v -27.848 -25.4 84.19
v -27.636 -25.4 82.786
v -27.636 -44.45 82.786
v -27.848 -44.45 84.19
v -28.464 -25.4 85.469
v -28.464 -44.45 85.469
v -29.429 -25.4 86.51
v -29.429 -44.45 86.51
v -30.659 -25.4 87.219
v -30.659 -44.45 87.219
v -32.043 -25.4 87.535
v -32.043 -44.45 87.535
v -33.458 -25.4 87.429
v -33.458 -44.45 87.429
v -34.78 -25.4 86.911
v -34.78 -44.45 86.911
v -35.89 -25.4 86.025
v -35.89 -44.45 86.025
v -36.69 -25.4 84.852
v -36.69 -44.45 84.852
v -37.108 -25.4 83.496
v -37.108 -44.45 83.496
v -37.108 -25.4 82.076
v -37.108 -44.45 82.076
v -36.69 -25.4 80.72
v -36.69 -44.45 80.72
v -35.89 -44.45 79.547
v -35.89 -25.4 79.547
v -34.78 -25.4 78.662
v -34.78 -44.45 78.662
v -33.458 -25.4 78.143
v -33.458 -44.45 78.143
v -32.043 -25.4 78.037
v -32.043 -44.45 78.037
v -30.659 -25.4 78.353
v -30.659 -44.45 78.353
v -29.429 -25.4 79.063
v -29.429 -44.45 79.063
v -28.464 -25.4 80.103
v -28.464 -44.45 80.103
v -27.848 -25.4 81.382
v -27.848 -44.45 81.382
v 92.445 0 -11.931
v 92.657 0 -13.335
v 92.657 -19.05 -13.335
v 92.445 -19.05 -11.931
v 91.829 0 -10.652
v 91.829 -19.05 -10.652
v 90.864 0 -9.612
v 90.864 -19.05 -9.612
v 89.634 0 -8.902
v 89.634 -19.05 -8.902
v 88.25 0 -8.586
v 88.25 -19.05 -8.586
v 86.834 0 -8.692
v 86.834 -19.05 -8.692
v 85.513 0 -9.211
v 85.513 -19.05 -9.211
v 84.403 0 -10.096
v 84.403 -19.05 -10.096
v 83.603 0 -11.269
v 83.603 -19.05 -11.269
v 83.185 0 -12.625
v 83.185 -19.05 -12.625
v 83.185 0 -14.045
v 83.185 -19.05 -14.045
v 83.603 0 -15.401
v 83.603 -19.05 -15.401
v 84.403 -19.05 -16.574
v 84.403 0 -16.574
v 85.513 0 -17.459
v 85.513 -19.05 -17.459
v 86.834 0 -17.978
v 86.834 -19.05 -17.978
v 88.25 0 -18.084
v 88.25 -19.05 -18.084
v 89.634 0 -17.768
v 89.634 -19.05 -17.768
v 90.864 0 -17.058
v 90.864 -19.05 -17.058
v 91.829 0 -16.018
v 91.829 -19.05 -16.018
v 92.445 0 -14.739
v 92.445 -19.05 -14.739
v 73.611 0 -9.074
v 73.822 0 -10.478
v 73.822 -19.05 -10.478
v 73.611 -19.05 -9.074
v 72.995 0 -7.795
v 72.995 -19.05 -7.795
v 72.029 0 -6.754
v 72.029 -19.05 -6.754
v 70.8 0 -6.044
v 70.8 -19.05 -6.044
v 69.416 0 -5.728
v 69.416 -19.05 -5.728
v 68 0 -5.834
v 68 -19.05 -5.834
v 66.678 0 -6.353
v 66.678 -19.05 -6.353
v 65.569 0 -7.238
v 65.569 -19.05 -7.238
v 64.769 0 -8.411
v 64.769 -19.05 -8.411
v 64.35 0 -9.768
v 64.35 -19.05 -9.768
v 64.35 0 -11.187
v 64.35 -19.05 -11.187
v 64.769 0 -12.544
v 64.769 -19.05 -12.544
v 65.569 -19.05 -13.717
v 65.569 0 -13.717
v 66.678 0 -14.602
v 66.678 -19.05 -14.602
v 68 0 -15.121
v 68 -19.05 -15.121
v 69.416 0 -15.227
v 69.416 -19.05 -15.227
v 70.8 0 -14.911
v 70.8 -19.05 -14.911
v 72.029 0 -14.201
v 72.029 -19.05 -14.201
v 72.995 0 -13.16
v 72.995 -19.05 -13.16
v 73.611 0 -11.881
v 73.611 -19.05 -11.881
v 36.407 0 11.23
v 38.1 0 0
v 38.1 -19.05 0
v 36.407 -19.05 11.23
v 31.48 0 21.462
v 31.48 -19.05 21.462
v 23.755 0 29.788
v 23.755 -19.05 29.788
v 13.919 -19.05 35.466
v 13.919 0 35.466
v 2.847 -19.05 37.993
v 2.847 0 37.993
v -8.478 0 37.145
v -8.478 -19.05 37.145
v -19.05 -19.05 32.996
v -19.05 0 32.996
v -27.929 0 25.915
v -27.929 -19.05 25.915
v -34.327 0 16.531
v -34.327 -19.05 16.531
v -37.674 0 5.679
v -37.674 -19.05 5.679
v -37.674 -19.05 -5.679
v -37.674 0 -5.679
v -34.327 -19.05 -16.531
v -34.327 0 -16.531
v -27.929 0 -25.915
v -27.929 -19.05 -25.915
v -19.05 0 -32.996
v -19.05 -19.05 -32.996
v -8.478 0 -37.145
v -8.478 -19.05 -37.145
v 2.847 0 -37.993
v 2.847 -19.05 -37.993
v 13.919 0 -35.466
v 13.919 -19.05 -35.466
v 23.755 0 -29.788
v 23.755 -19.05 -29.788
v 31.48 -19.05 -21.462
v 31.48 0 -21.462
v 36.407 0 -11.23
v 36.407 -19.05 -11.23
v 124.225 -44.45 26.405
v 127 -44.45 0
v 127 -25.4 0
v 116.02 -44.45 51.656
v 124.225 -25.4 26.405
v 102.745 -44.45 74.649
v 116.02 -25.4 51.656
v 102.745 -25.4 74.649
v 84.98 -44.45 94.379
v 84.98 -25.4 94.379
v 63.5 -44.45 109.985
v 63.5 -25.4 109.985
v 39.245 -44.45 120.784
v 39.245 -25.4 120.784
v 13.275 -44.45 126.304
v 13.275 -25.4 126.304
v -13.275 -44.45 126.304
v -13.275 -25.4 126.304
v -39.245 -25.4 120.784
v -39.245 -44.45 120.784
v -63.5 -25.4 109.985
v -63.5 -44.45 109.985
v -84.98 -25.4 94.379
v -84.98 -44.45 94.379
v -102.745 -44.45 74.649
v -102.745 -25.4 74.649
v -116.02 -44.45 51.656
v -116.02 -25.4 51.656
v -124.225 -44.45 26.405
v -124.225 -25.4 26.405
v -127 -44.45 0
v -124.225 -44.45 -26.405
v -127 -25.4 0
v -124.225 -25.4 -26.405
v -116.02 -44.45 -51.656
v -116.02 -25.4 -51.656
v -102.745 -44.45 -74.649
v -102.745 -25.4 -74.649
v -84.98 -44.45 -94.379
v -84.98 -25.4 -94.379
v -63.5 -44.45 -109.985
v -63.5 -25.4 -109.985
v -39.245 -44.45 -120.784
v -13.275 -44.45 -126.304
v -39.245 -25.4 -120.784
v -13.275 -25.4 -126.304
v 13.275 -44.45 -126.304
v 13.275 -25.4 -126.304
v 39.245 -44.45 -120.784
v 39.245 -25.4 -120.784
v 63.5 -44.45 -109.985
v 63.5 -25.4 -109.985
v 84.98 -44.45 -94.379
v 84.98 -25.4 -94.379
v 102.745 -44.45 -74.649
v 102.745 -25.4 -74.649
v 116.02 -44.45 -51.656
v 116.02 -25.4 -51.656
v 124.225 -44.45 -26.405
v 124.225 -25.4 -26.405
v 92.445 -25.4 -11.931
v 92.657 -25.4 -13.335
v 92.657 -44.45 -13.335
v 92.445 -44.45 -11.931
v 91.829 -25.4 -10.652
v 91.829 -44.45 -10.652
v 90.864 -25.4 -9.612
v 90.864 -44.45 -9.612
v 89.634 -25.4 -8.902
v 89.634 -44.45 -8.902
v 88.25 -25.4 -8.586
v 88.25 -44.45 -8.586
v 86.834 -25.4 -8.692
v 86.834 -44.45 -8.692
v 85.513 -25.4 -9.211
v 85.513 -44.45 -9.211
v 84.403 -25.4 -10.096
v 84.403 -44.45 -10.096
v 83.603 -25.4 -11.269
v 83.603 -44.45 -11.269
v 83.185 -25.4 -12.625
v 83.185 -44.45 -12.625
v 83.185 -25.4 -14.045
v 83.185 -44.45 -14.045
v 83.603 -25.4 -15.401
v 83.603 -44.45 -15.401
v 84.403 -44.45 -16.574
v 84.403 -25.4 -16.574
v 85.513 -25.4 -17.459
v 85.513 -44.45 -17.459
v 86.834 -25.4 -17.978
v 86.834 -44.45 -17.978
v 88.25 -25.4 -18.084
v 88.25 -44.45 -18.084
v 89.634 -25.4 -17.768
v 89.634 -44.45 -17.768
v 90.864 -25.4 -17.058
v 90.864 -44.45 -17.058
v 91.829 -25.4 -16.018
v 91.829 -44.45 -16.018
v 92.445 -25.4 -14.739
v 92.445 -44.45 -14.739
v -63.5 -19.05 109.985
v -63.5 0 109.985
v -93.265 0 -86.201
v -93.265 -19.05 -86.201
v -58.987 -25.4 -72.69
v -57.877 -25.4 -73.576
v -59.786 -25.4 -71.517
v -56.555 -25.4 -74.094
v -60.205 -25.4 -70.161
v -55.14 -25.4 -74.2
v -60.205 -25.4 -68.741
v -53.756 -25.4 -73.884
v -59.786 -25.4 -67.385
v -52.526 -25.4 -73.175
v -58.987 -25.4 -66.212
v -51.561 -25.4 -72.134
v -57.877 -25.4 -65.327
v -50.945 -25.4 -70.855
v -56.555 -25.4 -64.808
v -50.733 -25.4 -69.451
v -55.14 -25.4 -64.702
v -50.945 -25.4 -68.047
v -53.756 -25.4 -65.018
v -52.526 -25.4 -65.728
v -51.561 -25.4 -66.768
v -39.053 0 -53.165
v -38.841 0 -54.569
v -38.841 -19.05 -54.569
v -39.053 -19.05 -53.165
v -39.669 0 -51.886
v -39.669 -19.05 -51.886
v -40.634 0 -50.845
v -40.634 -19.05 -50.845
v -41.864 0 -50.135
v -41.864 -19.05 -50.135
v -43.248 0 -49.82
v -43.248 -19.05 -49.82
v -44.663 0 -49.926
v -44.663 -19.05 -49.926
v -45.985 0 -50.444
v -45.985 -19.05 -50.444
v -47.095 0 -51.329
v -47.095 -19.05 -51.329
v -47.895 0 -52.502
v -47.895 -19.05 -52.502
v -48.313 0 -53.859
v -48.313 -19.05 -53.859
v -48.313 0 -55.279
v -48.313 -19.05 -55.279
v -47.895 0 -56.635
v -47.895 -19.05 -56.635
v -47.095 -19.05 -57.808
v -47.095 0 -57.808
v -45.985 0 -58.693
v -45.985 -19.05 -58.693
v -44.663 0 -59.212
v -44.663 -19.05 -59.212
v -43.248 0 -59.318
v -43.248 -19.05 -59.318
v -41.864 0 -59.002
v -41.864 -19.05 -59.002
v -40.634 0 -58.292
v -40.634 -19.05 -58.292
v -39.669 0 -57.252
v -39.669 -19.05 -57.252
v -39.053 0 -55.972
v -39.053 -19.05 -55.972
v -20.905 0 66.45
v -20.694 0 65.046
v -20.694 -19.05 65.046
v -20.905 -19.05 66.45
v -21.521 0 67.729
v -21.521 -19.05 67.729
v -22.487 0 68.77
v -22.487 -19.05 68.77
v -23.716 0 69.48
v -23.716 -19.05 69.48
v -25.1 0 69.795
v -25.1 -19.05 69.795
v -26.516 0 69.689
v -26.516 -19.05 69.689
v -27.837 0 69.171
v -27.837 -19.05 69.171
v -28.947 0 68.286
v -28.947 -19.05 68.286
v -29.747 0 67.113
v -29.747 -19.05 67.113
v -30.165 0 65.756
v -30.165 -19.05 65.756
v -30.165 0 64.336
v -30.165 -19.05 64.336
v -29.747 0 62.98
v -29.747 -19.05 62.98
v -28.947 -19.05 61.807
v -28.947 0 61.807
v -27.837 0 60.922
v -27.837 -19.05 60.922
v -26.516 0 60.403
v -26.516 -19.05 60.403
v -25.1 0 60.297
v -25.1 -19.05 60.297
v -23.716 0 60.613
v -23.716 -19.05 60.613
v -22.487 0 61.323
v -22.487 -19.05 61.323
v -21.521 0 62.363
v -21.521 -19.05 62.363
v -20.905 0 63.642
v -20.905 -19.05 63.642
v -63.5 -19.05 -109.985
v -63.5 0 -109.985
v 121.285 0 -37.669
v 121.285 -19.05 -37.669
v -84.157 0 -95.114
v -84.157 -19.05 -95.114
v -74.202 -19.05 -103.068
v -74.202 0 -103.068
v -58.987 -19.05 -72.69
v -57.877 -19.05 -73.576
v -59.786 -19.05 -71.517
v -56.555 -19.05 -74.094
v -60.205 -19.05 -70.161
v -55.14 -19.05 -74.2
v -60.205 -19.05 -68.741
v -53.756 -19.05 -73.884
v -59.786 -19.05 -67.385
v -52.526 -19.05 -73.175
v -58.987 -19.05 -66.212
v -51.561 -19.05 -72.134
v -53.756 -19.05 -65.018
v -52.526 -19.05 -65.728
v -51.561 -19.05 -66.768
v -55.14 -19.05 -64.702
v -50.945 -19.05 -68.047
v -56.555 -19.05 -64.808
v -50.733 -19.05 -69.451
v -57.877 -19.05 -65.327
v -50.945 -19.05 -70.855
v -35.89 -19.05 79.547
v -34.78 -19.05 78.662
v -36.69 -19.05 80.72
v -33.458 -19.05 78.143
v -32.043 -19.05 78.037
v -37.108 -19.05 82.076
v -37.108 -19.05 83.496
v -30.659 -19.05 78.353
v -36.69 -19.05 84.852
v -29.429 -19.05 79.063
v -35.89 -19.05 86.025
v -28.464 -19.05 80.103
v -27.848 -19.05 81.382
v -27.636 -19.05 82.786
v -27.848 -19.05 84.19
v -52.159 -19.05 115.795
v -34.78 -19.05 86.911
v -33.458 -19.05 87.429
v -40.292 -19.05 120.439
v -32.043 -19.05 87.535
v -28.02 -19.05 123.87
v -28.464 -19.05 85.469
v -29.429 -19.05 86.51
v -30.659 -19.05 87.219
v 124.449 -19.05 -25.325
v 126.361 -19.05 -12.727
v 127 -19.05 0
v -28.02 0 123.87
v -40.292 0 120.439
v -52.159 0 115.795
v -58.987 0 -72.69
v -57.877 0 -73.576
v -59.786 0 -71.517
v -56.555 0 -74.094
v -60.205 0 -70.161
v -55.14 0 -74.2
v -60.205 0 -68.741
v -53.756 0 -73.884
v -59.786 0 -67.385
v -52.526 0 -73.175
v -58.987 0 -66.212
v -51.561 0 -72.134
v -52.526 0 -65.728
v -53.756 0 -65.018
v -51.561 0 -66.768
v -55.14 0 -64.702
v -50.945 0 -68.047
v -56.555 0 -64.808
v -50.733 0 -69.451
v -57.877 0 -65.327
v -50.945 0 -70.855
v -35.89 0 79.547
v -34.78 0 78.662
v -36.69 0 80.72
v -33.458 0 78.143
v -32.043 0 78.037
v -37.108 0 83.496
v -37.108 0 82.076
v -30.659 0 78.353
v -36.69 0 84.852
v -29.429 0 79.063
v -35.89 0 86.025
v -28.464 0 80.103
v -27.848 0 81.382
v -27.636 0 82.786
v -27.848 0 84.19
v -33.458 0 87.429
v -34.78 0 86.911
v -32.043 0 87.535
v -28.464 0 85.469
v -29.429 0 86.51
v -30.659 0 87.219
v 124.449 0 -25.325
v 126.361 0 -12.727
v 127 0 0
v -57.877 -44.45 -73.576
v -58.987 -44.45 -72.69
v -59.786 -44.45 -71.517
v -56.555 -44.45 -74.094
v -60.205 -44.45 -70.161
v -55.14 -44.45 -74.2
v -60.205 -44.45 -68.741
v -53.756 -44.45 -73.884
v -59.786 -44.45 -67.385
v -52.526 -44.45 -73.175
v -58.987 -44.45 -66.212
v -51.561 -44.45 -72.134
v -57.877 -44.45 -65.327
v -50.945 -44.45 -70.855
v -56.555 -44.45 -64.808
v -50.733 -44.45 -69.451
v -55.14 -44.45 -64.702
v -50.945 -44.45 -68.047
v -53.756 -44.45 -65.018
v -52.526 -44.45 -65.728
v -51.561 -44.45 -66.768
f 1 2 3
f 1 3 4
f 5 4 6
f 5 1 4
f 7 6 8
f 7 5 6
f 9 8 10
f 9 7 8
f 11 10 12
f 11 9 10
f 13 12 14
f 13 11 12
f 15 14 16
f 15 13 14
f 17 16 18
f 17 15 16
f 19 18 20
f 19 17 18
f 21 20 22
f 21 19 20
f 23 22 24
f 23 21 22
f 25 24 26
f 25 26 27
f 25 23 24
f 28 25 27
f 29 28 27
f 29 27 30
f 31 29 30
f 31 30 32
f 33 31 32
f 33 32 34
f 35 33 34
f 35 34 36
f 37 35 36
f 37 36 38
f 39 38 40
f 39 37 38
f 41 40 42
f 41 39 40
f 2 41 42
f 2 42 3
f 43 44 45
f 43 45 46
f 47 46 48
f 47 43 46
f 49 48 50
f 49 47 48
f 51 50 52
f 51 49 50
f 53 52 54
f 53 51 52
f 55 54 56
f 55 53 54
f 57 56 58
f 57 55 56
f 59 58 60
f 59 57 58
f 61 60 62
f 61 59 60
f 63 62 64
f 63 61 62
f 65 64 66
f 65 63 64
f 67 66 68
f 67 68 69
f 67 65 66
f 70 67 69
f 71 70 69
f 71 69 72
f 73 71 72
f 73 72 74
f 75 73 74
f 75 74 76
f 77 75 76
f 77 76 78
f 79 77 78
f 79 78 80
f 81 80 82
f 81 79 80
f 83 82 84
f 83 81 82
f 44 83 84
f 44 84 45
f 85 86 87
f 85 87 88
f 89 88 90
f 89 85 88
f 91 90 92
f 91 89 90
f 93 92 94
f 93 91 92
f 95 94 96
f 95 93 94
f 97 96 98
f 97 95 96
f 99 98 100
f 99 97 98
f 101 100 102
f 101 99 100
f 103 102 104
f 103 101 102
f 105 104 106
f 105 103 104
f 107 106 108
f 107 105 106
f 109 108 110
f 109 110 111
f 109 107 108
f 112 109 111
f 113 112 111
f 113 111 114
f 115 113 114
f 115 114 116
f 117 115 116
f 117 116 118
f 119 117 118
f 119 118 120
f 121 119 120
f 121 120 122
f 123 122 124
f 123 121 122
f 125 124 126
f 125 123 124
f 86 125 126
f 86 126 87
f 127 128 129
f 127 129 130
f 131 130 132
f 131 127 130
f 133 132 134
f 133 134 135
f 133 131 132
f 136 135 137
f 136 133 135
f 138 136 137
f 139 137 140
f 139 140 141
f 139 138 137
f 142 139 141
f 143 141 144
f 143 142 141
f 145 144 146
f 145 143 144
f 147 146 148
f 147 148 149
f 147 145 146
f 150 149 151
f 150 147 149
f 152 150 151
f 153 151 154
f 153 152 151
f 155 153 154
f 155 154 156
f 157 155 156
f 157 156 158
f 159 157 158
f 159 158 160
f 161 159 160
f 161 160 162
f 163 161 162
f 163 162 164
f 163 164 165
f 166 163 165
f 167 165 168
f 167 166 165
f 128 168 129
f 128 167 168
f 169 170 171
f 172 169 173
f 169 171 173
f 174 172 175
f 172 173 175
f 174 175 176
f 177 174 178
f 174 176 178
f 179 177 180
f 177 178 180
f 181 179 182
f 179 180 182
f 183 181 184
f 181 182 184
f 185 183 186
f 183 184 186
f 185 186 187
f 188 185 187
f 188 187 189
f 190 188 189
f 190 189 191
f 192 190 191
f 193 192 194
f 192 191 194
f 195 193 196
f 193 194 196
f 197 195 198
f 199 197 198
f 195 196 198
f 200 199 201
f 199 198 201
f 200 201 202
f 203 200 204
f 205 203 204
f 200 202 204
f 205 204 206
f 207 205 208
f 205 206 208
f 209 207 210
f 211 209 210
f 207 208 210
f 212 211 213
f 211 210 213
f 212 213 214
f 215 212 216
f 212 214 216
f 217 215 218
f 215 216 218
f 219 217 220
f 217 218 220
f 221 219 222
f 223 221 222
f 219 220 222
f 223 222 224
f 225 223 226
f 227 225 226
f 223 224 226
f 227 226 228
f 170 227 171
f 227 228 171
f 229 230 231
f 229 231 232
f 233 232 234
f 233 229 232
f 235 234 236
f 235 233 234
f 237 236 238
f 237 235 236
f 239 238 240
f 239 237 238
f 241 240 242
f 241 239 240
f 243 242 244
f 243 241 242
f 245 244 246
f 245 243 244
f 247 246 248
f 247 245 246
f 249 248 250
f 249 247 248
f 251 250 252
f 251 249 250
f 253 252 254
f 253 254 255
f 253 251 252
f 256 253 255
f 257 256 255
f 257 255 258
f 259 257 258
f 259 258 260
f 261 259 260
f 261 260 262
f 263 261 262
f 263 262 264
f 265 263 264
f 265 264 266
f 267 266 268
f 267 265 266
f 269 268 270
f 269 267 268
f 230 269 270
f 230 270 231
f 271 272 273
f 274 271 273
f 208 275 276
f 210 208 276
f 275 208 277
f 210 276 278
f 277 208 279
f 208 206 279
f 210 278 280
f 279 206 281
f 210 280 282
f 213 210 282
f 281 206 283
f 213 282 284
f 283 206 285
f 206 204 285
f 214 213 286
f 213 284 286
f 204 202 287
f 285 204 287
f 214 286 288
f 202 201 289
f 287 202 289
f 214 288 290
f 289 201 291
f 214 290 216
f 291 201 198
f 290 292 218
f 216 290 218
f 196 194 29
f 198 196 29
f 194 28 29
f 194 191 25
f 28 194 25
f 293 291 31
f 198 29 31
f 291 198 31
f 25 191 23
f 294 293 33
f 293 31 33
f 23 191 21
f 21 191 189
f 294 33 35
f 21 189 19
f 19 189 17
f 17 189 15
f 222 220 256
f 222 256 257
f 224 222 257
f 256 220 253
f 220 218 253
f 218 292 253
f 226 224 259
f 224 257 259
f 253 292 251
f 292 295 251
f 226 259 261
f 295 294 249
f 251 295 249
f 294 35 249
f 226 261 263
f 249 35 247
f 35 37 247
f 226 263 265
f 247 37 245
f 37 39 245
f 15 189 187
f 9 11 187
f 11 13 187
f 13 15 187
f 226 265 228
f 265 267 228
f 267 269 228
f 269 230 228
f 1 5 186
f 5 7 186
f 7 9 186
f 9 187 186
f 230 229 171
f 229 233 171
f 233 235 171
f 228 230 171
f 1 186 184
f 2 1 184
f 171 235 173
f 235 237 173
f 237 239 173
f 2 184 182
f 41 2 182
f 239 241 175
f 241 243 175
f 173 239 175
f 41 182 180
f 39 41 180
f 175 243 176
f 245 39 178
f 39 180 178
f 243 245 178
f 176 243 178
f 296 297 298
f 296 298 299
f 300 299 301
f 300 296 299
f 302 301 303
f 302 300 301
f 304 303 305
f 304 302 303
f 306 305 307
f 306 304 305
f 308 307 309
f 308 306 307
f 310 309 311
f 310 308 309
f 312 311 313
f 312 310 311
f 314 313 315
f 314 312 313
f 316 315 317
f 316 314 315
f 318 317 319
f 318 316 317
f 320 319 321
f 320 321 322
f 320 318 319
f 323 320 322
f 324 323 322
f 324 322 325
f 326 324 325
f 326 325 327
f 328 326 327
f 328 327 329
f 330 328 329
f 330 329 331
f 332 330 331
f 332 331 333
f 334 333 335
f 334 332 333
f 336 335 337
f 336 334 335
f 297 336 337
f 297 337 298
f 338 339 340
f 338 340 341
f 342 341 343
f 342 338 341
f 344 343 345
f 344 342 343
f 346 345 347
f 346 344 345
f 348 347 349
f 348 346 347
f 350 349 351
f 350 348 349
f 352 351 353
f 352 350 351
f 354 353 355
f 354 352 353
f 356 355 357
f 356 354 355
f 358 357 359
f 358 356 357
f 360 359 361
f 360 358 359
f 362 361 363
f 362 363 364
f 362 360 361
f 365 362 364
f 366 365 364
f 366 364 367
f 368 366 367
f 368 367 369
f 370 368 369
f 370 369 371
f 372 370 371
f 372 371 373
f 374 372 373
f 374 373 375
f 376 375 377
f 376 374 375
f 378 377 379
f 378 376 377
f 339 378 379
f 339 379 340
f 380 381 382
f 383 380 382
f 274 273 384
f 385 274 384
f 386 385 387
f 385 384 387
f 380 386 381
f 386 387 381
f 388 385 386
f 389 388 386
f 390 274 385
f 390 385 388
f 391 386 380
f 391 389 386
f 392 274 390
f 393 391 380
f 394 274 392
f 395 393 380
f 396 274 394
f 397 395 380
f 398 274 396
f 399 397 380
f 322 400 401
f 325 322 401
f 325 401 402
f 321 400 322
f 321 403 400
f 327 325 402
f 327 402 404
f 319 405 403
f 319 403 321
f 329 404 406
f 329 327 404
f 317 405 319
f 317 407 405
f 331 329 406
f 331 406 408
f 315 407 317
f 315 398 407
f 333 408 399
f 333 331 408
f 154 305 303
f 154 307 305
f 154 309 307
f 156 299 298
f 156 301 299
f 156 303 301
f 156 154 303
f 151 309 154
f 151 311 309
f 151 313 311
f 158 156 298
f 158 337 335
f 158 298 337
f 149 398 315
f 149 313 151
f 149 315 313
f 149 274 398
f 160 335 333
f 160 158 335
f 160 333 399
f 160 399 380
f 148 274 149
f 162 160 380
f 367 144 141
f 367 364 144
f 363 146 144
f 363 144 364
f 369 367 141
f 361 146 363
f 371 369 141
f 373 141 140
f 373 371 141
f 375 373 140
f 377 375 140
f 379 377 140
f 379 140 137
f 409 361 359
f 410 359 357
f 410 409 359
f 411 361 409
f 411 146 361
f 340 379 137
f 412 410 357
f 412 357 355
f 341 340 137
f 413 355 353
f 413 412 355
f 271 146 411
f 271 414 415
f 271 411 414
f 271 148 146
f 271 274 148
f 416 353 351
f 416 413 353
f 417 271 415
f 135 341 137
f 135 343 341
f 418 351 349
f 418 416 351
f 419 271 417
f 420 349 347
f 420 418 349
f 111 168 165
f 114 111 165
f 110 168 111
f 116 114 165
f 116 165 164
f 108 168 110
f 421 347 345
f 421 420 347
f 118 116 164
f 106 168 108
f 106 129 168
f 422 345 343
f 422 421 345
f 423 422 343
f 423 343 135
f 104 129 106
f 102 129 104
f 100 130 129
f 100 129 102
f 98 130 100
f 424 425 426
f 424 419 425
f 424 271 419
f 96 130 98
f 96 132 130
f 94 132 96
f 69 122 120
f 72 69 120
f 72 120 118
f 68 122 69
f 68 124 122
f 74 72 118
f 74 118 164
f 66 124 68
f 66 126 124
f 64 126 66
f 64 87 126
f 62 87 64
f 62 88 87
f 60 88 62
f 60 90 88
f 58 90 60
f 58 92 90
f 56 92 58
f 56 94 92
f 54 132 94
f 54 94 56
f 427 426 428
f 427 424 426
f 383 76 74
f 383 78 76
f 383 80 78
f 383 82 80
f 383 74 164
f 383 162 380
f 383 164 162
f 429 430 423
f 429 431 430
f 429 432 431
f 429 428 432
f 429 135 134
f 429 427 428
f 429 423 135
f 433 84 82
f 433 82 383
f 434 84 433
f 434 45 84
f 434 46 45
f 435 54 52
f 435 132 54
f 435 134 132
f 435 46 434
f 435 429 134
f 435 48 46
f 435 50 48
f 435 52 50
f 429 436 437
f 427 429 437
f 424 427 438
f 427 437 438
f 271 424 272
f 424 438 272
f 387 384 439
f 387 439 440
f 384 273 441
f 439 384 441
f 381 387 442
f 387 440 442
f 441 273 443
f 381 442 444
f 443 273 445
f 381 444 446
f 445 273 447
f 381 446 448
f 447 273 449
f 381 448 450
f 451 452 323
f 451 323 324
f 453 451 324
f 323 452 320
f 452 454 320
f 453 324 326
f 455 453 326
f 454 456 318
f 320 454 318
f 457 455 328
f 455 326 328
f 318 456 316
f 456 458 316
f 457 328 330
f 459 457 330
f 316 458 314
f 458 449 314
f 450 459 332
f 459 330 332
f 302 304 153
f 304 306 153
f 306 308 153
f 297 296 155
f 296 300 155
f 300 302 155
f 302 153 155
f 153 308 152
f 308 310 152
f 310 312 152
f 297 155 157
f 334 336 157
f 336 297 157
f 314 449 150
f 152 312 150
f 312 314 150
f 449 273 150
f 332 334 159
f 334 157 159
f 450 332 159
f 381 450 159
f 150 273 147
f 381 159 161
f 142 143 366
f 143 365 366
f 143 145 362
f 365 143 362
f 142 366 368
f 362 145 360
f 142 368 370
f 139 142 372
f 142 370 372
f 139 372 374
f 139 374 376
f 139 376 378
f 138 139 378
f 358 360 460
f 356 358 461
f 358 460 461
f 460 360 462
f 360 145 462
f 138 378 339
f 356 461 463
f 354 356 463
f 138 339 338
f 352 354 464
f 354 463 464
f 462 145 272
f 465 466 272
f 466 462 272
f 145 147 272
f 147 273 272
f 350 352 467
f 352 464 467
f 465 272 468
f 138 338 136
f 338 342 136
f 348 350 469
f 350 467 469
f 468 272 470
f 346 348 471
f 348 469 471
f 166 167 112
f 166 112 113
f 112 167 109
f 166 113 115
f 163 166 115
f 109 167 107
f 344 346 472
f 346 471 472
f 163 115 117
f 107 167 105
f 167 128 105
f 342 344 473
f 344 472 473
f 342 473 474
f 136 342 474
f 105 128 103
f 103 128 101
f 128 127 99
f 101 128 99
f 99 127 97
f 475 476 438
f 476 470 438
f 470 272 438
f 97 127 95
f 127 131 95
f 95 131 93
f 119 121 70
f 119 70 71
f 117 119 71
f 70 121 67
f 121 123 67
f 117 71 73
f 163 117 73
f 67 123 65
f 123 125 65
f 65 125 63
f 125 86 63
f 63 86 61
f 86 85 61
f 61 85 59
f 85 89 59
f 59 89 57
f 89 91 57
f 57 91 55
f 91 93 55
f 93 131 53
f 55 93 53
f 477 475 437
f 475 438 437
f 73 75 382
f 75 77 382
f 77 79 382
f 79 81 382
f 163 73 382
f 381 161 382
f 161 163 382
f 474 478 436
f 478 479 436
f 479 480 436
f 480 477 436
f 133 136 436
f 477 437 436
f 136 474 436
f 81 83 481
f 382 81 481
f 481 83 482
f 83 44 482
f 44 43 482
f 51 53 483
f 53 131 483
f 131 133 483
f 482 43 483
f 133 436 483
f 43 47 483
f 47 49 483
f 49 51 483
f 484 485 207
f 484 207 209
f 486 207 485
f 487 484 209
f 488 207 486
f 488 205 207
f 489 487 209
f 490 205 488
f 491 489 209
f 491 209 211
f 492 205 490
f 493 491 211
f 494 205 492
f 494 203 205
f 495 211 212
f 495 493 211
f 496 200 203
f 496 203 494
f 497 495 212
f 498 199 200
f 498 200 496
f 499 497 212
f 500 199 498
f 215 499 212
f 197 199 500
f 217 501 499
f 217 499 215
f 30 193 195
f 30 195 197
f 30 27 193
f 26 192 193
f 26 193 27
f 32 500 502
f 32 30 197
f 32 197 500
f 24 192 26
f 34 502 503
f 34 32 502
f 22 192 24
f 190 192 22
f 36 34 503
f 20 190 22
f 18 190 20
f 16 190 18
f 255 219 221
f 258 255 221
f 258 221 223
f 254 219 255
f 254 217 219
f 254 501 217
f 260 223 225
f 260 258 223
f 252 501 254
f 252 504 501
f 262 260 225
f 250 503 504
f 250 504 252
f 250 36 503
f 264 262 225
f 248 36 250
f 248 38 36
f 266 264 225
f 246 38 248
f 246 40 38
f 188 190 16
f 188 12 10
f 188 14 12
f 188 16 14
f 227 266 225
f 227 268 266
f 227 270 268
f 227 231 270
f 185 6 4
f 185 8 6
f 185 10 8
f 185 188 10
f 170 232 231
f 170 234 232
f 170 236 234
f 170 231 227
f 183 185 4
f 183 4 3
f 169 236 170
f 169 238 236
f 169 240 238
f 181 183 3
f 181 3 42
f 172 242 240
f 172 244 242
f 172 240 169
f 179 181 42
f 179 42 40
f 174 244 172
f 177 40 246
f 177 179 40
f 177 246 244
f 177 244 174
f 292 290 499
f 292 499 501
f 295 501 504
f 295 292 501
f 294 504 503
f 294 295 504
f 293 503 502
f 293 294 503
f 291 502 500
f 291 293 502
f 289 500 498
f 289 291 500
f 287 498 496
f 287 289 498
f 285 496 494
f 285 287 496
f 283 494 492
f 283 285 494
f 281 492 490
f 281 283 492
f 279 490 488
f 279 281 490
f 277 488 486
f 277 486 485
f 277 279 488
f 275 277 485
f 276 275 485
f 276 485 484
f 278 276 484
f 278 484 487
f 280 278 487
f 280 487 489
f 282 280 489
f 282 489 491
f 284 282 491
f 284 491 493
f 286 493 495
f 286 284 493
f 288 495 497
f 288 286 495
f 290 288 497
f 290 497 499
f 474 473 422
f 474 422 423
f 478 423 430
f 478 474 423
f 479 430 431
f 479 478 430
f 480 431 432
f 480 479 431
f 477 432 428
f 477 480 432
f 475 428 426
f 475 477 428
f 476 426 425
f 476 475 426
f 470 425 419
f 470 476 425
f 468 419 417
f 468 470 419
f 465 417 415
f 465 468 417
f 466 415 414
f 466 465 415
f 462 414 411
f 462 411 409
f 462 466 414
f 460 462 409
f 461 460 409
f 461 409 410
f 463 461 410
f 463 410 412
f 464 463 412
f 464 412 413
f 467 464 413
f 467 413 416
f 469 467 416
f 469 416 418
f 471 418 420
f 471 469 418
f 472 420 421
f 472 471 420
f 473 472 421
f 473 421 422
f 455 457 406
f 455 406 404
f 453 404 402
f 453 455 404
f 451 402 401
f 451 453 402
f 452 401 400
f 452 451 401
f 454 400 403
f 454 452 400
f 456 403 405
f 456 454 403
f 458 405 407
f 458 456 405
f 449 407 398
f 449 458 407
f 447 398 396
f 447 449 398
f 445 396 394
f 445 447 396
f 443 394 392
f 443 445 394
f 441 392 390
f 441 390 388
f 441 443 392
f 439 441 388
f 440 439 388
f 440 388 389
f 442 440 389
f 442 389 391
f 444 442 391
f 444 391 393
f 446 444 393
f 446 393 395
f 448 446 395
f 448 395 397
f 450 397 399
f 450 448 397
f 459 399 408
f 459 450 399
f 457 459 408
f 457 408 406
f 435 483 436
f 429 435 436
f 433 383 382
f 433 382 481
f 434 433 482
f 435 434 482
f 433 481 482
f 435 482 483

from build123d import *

# Parameters (mm, degrees)
F0_R     = 4.7625
F0_R_2   = 38.1
F1_DEPTH = 19.05
F3_R     = 127
F3_R_2   = 4.7625
F4_DEPTH = 19.05


with BuildPart() as f1:
    # F0 (on Front) → F1 (new body)
    with BuildSketch(Plane.XZ):
        with BuildLine():
            Line((-63.5, 109.985226), (-93.264756, -86.201423))
            ThreePointArc((-93.264756, -86.201423), (-79.279345, -99.215853), (-63.5, -109.985226))
            Line((-63.5, -109.985226), (121.285, -37.668936))
            ThreePointArc((121.285, -37.668936), (125.563122, -19.05), (127, 0))
            Line((127, 0), (-28.020244, 123.870359))
            ThreePointArc((-28.020244, 123.870359), (-46.283777, 118.265853), (-63.5, 109.985226))
        make_face()
        with Locations((-55.495541, -69.451097)):
            Circle(F0_R, mode=Mode.SUBTRACT)
        with Locations((-43.60364, -54.568719)):
            Circle(F0_R, mode=Mode.SUBTRACT)
        Circle(F0_R_2, mode=Mode.SUBTRACT)
        with Locations((69.059717, -10.4775)):
            Circle(F0_R, mode=Mode.SUBTRACT)
        with Locations((87.894185, -13.335)):
            Circle(F0_R, mode=Mode.SUBTRACT)
        with Locations((-25.456077, 65.046219)):
            Circle(F0_R, mode=Mode.SUBTRACT)
        with Locations((-32.398644, 82.786097)):
            Circle(F0_R, mode=Mode.SUBTRACT)
    extrude(amount=F1_DEPTH)


with BuildPart() as f4:
    # F3 (on offset) → F4 (new body)
    with BuildSketch(Plane.XZ.offset(25.4)):
        Circle(F3_R)
        with Locations((-55.495541, -69.451097)):
            Circle(F3_R_2, mode=Mode.SUBTRACT)
        with Locations((87.894185, -13.335)):
            Circle(F3_R_2, mode=Mode.SUBTRACT)
        with Locations((-32.398644, 82.786097)):
            Circle(F3_R_2, mode=Mode.SUBTRACT)
    extrude(amount=F4_DEPTH)


solid = Compound([f1.part, f4.part])
